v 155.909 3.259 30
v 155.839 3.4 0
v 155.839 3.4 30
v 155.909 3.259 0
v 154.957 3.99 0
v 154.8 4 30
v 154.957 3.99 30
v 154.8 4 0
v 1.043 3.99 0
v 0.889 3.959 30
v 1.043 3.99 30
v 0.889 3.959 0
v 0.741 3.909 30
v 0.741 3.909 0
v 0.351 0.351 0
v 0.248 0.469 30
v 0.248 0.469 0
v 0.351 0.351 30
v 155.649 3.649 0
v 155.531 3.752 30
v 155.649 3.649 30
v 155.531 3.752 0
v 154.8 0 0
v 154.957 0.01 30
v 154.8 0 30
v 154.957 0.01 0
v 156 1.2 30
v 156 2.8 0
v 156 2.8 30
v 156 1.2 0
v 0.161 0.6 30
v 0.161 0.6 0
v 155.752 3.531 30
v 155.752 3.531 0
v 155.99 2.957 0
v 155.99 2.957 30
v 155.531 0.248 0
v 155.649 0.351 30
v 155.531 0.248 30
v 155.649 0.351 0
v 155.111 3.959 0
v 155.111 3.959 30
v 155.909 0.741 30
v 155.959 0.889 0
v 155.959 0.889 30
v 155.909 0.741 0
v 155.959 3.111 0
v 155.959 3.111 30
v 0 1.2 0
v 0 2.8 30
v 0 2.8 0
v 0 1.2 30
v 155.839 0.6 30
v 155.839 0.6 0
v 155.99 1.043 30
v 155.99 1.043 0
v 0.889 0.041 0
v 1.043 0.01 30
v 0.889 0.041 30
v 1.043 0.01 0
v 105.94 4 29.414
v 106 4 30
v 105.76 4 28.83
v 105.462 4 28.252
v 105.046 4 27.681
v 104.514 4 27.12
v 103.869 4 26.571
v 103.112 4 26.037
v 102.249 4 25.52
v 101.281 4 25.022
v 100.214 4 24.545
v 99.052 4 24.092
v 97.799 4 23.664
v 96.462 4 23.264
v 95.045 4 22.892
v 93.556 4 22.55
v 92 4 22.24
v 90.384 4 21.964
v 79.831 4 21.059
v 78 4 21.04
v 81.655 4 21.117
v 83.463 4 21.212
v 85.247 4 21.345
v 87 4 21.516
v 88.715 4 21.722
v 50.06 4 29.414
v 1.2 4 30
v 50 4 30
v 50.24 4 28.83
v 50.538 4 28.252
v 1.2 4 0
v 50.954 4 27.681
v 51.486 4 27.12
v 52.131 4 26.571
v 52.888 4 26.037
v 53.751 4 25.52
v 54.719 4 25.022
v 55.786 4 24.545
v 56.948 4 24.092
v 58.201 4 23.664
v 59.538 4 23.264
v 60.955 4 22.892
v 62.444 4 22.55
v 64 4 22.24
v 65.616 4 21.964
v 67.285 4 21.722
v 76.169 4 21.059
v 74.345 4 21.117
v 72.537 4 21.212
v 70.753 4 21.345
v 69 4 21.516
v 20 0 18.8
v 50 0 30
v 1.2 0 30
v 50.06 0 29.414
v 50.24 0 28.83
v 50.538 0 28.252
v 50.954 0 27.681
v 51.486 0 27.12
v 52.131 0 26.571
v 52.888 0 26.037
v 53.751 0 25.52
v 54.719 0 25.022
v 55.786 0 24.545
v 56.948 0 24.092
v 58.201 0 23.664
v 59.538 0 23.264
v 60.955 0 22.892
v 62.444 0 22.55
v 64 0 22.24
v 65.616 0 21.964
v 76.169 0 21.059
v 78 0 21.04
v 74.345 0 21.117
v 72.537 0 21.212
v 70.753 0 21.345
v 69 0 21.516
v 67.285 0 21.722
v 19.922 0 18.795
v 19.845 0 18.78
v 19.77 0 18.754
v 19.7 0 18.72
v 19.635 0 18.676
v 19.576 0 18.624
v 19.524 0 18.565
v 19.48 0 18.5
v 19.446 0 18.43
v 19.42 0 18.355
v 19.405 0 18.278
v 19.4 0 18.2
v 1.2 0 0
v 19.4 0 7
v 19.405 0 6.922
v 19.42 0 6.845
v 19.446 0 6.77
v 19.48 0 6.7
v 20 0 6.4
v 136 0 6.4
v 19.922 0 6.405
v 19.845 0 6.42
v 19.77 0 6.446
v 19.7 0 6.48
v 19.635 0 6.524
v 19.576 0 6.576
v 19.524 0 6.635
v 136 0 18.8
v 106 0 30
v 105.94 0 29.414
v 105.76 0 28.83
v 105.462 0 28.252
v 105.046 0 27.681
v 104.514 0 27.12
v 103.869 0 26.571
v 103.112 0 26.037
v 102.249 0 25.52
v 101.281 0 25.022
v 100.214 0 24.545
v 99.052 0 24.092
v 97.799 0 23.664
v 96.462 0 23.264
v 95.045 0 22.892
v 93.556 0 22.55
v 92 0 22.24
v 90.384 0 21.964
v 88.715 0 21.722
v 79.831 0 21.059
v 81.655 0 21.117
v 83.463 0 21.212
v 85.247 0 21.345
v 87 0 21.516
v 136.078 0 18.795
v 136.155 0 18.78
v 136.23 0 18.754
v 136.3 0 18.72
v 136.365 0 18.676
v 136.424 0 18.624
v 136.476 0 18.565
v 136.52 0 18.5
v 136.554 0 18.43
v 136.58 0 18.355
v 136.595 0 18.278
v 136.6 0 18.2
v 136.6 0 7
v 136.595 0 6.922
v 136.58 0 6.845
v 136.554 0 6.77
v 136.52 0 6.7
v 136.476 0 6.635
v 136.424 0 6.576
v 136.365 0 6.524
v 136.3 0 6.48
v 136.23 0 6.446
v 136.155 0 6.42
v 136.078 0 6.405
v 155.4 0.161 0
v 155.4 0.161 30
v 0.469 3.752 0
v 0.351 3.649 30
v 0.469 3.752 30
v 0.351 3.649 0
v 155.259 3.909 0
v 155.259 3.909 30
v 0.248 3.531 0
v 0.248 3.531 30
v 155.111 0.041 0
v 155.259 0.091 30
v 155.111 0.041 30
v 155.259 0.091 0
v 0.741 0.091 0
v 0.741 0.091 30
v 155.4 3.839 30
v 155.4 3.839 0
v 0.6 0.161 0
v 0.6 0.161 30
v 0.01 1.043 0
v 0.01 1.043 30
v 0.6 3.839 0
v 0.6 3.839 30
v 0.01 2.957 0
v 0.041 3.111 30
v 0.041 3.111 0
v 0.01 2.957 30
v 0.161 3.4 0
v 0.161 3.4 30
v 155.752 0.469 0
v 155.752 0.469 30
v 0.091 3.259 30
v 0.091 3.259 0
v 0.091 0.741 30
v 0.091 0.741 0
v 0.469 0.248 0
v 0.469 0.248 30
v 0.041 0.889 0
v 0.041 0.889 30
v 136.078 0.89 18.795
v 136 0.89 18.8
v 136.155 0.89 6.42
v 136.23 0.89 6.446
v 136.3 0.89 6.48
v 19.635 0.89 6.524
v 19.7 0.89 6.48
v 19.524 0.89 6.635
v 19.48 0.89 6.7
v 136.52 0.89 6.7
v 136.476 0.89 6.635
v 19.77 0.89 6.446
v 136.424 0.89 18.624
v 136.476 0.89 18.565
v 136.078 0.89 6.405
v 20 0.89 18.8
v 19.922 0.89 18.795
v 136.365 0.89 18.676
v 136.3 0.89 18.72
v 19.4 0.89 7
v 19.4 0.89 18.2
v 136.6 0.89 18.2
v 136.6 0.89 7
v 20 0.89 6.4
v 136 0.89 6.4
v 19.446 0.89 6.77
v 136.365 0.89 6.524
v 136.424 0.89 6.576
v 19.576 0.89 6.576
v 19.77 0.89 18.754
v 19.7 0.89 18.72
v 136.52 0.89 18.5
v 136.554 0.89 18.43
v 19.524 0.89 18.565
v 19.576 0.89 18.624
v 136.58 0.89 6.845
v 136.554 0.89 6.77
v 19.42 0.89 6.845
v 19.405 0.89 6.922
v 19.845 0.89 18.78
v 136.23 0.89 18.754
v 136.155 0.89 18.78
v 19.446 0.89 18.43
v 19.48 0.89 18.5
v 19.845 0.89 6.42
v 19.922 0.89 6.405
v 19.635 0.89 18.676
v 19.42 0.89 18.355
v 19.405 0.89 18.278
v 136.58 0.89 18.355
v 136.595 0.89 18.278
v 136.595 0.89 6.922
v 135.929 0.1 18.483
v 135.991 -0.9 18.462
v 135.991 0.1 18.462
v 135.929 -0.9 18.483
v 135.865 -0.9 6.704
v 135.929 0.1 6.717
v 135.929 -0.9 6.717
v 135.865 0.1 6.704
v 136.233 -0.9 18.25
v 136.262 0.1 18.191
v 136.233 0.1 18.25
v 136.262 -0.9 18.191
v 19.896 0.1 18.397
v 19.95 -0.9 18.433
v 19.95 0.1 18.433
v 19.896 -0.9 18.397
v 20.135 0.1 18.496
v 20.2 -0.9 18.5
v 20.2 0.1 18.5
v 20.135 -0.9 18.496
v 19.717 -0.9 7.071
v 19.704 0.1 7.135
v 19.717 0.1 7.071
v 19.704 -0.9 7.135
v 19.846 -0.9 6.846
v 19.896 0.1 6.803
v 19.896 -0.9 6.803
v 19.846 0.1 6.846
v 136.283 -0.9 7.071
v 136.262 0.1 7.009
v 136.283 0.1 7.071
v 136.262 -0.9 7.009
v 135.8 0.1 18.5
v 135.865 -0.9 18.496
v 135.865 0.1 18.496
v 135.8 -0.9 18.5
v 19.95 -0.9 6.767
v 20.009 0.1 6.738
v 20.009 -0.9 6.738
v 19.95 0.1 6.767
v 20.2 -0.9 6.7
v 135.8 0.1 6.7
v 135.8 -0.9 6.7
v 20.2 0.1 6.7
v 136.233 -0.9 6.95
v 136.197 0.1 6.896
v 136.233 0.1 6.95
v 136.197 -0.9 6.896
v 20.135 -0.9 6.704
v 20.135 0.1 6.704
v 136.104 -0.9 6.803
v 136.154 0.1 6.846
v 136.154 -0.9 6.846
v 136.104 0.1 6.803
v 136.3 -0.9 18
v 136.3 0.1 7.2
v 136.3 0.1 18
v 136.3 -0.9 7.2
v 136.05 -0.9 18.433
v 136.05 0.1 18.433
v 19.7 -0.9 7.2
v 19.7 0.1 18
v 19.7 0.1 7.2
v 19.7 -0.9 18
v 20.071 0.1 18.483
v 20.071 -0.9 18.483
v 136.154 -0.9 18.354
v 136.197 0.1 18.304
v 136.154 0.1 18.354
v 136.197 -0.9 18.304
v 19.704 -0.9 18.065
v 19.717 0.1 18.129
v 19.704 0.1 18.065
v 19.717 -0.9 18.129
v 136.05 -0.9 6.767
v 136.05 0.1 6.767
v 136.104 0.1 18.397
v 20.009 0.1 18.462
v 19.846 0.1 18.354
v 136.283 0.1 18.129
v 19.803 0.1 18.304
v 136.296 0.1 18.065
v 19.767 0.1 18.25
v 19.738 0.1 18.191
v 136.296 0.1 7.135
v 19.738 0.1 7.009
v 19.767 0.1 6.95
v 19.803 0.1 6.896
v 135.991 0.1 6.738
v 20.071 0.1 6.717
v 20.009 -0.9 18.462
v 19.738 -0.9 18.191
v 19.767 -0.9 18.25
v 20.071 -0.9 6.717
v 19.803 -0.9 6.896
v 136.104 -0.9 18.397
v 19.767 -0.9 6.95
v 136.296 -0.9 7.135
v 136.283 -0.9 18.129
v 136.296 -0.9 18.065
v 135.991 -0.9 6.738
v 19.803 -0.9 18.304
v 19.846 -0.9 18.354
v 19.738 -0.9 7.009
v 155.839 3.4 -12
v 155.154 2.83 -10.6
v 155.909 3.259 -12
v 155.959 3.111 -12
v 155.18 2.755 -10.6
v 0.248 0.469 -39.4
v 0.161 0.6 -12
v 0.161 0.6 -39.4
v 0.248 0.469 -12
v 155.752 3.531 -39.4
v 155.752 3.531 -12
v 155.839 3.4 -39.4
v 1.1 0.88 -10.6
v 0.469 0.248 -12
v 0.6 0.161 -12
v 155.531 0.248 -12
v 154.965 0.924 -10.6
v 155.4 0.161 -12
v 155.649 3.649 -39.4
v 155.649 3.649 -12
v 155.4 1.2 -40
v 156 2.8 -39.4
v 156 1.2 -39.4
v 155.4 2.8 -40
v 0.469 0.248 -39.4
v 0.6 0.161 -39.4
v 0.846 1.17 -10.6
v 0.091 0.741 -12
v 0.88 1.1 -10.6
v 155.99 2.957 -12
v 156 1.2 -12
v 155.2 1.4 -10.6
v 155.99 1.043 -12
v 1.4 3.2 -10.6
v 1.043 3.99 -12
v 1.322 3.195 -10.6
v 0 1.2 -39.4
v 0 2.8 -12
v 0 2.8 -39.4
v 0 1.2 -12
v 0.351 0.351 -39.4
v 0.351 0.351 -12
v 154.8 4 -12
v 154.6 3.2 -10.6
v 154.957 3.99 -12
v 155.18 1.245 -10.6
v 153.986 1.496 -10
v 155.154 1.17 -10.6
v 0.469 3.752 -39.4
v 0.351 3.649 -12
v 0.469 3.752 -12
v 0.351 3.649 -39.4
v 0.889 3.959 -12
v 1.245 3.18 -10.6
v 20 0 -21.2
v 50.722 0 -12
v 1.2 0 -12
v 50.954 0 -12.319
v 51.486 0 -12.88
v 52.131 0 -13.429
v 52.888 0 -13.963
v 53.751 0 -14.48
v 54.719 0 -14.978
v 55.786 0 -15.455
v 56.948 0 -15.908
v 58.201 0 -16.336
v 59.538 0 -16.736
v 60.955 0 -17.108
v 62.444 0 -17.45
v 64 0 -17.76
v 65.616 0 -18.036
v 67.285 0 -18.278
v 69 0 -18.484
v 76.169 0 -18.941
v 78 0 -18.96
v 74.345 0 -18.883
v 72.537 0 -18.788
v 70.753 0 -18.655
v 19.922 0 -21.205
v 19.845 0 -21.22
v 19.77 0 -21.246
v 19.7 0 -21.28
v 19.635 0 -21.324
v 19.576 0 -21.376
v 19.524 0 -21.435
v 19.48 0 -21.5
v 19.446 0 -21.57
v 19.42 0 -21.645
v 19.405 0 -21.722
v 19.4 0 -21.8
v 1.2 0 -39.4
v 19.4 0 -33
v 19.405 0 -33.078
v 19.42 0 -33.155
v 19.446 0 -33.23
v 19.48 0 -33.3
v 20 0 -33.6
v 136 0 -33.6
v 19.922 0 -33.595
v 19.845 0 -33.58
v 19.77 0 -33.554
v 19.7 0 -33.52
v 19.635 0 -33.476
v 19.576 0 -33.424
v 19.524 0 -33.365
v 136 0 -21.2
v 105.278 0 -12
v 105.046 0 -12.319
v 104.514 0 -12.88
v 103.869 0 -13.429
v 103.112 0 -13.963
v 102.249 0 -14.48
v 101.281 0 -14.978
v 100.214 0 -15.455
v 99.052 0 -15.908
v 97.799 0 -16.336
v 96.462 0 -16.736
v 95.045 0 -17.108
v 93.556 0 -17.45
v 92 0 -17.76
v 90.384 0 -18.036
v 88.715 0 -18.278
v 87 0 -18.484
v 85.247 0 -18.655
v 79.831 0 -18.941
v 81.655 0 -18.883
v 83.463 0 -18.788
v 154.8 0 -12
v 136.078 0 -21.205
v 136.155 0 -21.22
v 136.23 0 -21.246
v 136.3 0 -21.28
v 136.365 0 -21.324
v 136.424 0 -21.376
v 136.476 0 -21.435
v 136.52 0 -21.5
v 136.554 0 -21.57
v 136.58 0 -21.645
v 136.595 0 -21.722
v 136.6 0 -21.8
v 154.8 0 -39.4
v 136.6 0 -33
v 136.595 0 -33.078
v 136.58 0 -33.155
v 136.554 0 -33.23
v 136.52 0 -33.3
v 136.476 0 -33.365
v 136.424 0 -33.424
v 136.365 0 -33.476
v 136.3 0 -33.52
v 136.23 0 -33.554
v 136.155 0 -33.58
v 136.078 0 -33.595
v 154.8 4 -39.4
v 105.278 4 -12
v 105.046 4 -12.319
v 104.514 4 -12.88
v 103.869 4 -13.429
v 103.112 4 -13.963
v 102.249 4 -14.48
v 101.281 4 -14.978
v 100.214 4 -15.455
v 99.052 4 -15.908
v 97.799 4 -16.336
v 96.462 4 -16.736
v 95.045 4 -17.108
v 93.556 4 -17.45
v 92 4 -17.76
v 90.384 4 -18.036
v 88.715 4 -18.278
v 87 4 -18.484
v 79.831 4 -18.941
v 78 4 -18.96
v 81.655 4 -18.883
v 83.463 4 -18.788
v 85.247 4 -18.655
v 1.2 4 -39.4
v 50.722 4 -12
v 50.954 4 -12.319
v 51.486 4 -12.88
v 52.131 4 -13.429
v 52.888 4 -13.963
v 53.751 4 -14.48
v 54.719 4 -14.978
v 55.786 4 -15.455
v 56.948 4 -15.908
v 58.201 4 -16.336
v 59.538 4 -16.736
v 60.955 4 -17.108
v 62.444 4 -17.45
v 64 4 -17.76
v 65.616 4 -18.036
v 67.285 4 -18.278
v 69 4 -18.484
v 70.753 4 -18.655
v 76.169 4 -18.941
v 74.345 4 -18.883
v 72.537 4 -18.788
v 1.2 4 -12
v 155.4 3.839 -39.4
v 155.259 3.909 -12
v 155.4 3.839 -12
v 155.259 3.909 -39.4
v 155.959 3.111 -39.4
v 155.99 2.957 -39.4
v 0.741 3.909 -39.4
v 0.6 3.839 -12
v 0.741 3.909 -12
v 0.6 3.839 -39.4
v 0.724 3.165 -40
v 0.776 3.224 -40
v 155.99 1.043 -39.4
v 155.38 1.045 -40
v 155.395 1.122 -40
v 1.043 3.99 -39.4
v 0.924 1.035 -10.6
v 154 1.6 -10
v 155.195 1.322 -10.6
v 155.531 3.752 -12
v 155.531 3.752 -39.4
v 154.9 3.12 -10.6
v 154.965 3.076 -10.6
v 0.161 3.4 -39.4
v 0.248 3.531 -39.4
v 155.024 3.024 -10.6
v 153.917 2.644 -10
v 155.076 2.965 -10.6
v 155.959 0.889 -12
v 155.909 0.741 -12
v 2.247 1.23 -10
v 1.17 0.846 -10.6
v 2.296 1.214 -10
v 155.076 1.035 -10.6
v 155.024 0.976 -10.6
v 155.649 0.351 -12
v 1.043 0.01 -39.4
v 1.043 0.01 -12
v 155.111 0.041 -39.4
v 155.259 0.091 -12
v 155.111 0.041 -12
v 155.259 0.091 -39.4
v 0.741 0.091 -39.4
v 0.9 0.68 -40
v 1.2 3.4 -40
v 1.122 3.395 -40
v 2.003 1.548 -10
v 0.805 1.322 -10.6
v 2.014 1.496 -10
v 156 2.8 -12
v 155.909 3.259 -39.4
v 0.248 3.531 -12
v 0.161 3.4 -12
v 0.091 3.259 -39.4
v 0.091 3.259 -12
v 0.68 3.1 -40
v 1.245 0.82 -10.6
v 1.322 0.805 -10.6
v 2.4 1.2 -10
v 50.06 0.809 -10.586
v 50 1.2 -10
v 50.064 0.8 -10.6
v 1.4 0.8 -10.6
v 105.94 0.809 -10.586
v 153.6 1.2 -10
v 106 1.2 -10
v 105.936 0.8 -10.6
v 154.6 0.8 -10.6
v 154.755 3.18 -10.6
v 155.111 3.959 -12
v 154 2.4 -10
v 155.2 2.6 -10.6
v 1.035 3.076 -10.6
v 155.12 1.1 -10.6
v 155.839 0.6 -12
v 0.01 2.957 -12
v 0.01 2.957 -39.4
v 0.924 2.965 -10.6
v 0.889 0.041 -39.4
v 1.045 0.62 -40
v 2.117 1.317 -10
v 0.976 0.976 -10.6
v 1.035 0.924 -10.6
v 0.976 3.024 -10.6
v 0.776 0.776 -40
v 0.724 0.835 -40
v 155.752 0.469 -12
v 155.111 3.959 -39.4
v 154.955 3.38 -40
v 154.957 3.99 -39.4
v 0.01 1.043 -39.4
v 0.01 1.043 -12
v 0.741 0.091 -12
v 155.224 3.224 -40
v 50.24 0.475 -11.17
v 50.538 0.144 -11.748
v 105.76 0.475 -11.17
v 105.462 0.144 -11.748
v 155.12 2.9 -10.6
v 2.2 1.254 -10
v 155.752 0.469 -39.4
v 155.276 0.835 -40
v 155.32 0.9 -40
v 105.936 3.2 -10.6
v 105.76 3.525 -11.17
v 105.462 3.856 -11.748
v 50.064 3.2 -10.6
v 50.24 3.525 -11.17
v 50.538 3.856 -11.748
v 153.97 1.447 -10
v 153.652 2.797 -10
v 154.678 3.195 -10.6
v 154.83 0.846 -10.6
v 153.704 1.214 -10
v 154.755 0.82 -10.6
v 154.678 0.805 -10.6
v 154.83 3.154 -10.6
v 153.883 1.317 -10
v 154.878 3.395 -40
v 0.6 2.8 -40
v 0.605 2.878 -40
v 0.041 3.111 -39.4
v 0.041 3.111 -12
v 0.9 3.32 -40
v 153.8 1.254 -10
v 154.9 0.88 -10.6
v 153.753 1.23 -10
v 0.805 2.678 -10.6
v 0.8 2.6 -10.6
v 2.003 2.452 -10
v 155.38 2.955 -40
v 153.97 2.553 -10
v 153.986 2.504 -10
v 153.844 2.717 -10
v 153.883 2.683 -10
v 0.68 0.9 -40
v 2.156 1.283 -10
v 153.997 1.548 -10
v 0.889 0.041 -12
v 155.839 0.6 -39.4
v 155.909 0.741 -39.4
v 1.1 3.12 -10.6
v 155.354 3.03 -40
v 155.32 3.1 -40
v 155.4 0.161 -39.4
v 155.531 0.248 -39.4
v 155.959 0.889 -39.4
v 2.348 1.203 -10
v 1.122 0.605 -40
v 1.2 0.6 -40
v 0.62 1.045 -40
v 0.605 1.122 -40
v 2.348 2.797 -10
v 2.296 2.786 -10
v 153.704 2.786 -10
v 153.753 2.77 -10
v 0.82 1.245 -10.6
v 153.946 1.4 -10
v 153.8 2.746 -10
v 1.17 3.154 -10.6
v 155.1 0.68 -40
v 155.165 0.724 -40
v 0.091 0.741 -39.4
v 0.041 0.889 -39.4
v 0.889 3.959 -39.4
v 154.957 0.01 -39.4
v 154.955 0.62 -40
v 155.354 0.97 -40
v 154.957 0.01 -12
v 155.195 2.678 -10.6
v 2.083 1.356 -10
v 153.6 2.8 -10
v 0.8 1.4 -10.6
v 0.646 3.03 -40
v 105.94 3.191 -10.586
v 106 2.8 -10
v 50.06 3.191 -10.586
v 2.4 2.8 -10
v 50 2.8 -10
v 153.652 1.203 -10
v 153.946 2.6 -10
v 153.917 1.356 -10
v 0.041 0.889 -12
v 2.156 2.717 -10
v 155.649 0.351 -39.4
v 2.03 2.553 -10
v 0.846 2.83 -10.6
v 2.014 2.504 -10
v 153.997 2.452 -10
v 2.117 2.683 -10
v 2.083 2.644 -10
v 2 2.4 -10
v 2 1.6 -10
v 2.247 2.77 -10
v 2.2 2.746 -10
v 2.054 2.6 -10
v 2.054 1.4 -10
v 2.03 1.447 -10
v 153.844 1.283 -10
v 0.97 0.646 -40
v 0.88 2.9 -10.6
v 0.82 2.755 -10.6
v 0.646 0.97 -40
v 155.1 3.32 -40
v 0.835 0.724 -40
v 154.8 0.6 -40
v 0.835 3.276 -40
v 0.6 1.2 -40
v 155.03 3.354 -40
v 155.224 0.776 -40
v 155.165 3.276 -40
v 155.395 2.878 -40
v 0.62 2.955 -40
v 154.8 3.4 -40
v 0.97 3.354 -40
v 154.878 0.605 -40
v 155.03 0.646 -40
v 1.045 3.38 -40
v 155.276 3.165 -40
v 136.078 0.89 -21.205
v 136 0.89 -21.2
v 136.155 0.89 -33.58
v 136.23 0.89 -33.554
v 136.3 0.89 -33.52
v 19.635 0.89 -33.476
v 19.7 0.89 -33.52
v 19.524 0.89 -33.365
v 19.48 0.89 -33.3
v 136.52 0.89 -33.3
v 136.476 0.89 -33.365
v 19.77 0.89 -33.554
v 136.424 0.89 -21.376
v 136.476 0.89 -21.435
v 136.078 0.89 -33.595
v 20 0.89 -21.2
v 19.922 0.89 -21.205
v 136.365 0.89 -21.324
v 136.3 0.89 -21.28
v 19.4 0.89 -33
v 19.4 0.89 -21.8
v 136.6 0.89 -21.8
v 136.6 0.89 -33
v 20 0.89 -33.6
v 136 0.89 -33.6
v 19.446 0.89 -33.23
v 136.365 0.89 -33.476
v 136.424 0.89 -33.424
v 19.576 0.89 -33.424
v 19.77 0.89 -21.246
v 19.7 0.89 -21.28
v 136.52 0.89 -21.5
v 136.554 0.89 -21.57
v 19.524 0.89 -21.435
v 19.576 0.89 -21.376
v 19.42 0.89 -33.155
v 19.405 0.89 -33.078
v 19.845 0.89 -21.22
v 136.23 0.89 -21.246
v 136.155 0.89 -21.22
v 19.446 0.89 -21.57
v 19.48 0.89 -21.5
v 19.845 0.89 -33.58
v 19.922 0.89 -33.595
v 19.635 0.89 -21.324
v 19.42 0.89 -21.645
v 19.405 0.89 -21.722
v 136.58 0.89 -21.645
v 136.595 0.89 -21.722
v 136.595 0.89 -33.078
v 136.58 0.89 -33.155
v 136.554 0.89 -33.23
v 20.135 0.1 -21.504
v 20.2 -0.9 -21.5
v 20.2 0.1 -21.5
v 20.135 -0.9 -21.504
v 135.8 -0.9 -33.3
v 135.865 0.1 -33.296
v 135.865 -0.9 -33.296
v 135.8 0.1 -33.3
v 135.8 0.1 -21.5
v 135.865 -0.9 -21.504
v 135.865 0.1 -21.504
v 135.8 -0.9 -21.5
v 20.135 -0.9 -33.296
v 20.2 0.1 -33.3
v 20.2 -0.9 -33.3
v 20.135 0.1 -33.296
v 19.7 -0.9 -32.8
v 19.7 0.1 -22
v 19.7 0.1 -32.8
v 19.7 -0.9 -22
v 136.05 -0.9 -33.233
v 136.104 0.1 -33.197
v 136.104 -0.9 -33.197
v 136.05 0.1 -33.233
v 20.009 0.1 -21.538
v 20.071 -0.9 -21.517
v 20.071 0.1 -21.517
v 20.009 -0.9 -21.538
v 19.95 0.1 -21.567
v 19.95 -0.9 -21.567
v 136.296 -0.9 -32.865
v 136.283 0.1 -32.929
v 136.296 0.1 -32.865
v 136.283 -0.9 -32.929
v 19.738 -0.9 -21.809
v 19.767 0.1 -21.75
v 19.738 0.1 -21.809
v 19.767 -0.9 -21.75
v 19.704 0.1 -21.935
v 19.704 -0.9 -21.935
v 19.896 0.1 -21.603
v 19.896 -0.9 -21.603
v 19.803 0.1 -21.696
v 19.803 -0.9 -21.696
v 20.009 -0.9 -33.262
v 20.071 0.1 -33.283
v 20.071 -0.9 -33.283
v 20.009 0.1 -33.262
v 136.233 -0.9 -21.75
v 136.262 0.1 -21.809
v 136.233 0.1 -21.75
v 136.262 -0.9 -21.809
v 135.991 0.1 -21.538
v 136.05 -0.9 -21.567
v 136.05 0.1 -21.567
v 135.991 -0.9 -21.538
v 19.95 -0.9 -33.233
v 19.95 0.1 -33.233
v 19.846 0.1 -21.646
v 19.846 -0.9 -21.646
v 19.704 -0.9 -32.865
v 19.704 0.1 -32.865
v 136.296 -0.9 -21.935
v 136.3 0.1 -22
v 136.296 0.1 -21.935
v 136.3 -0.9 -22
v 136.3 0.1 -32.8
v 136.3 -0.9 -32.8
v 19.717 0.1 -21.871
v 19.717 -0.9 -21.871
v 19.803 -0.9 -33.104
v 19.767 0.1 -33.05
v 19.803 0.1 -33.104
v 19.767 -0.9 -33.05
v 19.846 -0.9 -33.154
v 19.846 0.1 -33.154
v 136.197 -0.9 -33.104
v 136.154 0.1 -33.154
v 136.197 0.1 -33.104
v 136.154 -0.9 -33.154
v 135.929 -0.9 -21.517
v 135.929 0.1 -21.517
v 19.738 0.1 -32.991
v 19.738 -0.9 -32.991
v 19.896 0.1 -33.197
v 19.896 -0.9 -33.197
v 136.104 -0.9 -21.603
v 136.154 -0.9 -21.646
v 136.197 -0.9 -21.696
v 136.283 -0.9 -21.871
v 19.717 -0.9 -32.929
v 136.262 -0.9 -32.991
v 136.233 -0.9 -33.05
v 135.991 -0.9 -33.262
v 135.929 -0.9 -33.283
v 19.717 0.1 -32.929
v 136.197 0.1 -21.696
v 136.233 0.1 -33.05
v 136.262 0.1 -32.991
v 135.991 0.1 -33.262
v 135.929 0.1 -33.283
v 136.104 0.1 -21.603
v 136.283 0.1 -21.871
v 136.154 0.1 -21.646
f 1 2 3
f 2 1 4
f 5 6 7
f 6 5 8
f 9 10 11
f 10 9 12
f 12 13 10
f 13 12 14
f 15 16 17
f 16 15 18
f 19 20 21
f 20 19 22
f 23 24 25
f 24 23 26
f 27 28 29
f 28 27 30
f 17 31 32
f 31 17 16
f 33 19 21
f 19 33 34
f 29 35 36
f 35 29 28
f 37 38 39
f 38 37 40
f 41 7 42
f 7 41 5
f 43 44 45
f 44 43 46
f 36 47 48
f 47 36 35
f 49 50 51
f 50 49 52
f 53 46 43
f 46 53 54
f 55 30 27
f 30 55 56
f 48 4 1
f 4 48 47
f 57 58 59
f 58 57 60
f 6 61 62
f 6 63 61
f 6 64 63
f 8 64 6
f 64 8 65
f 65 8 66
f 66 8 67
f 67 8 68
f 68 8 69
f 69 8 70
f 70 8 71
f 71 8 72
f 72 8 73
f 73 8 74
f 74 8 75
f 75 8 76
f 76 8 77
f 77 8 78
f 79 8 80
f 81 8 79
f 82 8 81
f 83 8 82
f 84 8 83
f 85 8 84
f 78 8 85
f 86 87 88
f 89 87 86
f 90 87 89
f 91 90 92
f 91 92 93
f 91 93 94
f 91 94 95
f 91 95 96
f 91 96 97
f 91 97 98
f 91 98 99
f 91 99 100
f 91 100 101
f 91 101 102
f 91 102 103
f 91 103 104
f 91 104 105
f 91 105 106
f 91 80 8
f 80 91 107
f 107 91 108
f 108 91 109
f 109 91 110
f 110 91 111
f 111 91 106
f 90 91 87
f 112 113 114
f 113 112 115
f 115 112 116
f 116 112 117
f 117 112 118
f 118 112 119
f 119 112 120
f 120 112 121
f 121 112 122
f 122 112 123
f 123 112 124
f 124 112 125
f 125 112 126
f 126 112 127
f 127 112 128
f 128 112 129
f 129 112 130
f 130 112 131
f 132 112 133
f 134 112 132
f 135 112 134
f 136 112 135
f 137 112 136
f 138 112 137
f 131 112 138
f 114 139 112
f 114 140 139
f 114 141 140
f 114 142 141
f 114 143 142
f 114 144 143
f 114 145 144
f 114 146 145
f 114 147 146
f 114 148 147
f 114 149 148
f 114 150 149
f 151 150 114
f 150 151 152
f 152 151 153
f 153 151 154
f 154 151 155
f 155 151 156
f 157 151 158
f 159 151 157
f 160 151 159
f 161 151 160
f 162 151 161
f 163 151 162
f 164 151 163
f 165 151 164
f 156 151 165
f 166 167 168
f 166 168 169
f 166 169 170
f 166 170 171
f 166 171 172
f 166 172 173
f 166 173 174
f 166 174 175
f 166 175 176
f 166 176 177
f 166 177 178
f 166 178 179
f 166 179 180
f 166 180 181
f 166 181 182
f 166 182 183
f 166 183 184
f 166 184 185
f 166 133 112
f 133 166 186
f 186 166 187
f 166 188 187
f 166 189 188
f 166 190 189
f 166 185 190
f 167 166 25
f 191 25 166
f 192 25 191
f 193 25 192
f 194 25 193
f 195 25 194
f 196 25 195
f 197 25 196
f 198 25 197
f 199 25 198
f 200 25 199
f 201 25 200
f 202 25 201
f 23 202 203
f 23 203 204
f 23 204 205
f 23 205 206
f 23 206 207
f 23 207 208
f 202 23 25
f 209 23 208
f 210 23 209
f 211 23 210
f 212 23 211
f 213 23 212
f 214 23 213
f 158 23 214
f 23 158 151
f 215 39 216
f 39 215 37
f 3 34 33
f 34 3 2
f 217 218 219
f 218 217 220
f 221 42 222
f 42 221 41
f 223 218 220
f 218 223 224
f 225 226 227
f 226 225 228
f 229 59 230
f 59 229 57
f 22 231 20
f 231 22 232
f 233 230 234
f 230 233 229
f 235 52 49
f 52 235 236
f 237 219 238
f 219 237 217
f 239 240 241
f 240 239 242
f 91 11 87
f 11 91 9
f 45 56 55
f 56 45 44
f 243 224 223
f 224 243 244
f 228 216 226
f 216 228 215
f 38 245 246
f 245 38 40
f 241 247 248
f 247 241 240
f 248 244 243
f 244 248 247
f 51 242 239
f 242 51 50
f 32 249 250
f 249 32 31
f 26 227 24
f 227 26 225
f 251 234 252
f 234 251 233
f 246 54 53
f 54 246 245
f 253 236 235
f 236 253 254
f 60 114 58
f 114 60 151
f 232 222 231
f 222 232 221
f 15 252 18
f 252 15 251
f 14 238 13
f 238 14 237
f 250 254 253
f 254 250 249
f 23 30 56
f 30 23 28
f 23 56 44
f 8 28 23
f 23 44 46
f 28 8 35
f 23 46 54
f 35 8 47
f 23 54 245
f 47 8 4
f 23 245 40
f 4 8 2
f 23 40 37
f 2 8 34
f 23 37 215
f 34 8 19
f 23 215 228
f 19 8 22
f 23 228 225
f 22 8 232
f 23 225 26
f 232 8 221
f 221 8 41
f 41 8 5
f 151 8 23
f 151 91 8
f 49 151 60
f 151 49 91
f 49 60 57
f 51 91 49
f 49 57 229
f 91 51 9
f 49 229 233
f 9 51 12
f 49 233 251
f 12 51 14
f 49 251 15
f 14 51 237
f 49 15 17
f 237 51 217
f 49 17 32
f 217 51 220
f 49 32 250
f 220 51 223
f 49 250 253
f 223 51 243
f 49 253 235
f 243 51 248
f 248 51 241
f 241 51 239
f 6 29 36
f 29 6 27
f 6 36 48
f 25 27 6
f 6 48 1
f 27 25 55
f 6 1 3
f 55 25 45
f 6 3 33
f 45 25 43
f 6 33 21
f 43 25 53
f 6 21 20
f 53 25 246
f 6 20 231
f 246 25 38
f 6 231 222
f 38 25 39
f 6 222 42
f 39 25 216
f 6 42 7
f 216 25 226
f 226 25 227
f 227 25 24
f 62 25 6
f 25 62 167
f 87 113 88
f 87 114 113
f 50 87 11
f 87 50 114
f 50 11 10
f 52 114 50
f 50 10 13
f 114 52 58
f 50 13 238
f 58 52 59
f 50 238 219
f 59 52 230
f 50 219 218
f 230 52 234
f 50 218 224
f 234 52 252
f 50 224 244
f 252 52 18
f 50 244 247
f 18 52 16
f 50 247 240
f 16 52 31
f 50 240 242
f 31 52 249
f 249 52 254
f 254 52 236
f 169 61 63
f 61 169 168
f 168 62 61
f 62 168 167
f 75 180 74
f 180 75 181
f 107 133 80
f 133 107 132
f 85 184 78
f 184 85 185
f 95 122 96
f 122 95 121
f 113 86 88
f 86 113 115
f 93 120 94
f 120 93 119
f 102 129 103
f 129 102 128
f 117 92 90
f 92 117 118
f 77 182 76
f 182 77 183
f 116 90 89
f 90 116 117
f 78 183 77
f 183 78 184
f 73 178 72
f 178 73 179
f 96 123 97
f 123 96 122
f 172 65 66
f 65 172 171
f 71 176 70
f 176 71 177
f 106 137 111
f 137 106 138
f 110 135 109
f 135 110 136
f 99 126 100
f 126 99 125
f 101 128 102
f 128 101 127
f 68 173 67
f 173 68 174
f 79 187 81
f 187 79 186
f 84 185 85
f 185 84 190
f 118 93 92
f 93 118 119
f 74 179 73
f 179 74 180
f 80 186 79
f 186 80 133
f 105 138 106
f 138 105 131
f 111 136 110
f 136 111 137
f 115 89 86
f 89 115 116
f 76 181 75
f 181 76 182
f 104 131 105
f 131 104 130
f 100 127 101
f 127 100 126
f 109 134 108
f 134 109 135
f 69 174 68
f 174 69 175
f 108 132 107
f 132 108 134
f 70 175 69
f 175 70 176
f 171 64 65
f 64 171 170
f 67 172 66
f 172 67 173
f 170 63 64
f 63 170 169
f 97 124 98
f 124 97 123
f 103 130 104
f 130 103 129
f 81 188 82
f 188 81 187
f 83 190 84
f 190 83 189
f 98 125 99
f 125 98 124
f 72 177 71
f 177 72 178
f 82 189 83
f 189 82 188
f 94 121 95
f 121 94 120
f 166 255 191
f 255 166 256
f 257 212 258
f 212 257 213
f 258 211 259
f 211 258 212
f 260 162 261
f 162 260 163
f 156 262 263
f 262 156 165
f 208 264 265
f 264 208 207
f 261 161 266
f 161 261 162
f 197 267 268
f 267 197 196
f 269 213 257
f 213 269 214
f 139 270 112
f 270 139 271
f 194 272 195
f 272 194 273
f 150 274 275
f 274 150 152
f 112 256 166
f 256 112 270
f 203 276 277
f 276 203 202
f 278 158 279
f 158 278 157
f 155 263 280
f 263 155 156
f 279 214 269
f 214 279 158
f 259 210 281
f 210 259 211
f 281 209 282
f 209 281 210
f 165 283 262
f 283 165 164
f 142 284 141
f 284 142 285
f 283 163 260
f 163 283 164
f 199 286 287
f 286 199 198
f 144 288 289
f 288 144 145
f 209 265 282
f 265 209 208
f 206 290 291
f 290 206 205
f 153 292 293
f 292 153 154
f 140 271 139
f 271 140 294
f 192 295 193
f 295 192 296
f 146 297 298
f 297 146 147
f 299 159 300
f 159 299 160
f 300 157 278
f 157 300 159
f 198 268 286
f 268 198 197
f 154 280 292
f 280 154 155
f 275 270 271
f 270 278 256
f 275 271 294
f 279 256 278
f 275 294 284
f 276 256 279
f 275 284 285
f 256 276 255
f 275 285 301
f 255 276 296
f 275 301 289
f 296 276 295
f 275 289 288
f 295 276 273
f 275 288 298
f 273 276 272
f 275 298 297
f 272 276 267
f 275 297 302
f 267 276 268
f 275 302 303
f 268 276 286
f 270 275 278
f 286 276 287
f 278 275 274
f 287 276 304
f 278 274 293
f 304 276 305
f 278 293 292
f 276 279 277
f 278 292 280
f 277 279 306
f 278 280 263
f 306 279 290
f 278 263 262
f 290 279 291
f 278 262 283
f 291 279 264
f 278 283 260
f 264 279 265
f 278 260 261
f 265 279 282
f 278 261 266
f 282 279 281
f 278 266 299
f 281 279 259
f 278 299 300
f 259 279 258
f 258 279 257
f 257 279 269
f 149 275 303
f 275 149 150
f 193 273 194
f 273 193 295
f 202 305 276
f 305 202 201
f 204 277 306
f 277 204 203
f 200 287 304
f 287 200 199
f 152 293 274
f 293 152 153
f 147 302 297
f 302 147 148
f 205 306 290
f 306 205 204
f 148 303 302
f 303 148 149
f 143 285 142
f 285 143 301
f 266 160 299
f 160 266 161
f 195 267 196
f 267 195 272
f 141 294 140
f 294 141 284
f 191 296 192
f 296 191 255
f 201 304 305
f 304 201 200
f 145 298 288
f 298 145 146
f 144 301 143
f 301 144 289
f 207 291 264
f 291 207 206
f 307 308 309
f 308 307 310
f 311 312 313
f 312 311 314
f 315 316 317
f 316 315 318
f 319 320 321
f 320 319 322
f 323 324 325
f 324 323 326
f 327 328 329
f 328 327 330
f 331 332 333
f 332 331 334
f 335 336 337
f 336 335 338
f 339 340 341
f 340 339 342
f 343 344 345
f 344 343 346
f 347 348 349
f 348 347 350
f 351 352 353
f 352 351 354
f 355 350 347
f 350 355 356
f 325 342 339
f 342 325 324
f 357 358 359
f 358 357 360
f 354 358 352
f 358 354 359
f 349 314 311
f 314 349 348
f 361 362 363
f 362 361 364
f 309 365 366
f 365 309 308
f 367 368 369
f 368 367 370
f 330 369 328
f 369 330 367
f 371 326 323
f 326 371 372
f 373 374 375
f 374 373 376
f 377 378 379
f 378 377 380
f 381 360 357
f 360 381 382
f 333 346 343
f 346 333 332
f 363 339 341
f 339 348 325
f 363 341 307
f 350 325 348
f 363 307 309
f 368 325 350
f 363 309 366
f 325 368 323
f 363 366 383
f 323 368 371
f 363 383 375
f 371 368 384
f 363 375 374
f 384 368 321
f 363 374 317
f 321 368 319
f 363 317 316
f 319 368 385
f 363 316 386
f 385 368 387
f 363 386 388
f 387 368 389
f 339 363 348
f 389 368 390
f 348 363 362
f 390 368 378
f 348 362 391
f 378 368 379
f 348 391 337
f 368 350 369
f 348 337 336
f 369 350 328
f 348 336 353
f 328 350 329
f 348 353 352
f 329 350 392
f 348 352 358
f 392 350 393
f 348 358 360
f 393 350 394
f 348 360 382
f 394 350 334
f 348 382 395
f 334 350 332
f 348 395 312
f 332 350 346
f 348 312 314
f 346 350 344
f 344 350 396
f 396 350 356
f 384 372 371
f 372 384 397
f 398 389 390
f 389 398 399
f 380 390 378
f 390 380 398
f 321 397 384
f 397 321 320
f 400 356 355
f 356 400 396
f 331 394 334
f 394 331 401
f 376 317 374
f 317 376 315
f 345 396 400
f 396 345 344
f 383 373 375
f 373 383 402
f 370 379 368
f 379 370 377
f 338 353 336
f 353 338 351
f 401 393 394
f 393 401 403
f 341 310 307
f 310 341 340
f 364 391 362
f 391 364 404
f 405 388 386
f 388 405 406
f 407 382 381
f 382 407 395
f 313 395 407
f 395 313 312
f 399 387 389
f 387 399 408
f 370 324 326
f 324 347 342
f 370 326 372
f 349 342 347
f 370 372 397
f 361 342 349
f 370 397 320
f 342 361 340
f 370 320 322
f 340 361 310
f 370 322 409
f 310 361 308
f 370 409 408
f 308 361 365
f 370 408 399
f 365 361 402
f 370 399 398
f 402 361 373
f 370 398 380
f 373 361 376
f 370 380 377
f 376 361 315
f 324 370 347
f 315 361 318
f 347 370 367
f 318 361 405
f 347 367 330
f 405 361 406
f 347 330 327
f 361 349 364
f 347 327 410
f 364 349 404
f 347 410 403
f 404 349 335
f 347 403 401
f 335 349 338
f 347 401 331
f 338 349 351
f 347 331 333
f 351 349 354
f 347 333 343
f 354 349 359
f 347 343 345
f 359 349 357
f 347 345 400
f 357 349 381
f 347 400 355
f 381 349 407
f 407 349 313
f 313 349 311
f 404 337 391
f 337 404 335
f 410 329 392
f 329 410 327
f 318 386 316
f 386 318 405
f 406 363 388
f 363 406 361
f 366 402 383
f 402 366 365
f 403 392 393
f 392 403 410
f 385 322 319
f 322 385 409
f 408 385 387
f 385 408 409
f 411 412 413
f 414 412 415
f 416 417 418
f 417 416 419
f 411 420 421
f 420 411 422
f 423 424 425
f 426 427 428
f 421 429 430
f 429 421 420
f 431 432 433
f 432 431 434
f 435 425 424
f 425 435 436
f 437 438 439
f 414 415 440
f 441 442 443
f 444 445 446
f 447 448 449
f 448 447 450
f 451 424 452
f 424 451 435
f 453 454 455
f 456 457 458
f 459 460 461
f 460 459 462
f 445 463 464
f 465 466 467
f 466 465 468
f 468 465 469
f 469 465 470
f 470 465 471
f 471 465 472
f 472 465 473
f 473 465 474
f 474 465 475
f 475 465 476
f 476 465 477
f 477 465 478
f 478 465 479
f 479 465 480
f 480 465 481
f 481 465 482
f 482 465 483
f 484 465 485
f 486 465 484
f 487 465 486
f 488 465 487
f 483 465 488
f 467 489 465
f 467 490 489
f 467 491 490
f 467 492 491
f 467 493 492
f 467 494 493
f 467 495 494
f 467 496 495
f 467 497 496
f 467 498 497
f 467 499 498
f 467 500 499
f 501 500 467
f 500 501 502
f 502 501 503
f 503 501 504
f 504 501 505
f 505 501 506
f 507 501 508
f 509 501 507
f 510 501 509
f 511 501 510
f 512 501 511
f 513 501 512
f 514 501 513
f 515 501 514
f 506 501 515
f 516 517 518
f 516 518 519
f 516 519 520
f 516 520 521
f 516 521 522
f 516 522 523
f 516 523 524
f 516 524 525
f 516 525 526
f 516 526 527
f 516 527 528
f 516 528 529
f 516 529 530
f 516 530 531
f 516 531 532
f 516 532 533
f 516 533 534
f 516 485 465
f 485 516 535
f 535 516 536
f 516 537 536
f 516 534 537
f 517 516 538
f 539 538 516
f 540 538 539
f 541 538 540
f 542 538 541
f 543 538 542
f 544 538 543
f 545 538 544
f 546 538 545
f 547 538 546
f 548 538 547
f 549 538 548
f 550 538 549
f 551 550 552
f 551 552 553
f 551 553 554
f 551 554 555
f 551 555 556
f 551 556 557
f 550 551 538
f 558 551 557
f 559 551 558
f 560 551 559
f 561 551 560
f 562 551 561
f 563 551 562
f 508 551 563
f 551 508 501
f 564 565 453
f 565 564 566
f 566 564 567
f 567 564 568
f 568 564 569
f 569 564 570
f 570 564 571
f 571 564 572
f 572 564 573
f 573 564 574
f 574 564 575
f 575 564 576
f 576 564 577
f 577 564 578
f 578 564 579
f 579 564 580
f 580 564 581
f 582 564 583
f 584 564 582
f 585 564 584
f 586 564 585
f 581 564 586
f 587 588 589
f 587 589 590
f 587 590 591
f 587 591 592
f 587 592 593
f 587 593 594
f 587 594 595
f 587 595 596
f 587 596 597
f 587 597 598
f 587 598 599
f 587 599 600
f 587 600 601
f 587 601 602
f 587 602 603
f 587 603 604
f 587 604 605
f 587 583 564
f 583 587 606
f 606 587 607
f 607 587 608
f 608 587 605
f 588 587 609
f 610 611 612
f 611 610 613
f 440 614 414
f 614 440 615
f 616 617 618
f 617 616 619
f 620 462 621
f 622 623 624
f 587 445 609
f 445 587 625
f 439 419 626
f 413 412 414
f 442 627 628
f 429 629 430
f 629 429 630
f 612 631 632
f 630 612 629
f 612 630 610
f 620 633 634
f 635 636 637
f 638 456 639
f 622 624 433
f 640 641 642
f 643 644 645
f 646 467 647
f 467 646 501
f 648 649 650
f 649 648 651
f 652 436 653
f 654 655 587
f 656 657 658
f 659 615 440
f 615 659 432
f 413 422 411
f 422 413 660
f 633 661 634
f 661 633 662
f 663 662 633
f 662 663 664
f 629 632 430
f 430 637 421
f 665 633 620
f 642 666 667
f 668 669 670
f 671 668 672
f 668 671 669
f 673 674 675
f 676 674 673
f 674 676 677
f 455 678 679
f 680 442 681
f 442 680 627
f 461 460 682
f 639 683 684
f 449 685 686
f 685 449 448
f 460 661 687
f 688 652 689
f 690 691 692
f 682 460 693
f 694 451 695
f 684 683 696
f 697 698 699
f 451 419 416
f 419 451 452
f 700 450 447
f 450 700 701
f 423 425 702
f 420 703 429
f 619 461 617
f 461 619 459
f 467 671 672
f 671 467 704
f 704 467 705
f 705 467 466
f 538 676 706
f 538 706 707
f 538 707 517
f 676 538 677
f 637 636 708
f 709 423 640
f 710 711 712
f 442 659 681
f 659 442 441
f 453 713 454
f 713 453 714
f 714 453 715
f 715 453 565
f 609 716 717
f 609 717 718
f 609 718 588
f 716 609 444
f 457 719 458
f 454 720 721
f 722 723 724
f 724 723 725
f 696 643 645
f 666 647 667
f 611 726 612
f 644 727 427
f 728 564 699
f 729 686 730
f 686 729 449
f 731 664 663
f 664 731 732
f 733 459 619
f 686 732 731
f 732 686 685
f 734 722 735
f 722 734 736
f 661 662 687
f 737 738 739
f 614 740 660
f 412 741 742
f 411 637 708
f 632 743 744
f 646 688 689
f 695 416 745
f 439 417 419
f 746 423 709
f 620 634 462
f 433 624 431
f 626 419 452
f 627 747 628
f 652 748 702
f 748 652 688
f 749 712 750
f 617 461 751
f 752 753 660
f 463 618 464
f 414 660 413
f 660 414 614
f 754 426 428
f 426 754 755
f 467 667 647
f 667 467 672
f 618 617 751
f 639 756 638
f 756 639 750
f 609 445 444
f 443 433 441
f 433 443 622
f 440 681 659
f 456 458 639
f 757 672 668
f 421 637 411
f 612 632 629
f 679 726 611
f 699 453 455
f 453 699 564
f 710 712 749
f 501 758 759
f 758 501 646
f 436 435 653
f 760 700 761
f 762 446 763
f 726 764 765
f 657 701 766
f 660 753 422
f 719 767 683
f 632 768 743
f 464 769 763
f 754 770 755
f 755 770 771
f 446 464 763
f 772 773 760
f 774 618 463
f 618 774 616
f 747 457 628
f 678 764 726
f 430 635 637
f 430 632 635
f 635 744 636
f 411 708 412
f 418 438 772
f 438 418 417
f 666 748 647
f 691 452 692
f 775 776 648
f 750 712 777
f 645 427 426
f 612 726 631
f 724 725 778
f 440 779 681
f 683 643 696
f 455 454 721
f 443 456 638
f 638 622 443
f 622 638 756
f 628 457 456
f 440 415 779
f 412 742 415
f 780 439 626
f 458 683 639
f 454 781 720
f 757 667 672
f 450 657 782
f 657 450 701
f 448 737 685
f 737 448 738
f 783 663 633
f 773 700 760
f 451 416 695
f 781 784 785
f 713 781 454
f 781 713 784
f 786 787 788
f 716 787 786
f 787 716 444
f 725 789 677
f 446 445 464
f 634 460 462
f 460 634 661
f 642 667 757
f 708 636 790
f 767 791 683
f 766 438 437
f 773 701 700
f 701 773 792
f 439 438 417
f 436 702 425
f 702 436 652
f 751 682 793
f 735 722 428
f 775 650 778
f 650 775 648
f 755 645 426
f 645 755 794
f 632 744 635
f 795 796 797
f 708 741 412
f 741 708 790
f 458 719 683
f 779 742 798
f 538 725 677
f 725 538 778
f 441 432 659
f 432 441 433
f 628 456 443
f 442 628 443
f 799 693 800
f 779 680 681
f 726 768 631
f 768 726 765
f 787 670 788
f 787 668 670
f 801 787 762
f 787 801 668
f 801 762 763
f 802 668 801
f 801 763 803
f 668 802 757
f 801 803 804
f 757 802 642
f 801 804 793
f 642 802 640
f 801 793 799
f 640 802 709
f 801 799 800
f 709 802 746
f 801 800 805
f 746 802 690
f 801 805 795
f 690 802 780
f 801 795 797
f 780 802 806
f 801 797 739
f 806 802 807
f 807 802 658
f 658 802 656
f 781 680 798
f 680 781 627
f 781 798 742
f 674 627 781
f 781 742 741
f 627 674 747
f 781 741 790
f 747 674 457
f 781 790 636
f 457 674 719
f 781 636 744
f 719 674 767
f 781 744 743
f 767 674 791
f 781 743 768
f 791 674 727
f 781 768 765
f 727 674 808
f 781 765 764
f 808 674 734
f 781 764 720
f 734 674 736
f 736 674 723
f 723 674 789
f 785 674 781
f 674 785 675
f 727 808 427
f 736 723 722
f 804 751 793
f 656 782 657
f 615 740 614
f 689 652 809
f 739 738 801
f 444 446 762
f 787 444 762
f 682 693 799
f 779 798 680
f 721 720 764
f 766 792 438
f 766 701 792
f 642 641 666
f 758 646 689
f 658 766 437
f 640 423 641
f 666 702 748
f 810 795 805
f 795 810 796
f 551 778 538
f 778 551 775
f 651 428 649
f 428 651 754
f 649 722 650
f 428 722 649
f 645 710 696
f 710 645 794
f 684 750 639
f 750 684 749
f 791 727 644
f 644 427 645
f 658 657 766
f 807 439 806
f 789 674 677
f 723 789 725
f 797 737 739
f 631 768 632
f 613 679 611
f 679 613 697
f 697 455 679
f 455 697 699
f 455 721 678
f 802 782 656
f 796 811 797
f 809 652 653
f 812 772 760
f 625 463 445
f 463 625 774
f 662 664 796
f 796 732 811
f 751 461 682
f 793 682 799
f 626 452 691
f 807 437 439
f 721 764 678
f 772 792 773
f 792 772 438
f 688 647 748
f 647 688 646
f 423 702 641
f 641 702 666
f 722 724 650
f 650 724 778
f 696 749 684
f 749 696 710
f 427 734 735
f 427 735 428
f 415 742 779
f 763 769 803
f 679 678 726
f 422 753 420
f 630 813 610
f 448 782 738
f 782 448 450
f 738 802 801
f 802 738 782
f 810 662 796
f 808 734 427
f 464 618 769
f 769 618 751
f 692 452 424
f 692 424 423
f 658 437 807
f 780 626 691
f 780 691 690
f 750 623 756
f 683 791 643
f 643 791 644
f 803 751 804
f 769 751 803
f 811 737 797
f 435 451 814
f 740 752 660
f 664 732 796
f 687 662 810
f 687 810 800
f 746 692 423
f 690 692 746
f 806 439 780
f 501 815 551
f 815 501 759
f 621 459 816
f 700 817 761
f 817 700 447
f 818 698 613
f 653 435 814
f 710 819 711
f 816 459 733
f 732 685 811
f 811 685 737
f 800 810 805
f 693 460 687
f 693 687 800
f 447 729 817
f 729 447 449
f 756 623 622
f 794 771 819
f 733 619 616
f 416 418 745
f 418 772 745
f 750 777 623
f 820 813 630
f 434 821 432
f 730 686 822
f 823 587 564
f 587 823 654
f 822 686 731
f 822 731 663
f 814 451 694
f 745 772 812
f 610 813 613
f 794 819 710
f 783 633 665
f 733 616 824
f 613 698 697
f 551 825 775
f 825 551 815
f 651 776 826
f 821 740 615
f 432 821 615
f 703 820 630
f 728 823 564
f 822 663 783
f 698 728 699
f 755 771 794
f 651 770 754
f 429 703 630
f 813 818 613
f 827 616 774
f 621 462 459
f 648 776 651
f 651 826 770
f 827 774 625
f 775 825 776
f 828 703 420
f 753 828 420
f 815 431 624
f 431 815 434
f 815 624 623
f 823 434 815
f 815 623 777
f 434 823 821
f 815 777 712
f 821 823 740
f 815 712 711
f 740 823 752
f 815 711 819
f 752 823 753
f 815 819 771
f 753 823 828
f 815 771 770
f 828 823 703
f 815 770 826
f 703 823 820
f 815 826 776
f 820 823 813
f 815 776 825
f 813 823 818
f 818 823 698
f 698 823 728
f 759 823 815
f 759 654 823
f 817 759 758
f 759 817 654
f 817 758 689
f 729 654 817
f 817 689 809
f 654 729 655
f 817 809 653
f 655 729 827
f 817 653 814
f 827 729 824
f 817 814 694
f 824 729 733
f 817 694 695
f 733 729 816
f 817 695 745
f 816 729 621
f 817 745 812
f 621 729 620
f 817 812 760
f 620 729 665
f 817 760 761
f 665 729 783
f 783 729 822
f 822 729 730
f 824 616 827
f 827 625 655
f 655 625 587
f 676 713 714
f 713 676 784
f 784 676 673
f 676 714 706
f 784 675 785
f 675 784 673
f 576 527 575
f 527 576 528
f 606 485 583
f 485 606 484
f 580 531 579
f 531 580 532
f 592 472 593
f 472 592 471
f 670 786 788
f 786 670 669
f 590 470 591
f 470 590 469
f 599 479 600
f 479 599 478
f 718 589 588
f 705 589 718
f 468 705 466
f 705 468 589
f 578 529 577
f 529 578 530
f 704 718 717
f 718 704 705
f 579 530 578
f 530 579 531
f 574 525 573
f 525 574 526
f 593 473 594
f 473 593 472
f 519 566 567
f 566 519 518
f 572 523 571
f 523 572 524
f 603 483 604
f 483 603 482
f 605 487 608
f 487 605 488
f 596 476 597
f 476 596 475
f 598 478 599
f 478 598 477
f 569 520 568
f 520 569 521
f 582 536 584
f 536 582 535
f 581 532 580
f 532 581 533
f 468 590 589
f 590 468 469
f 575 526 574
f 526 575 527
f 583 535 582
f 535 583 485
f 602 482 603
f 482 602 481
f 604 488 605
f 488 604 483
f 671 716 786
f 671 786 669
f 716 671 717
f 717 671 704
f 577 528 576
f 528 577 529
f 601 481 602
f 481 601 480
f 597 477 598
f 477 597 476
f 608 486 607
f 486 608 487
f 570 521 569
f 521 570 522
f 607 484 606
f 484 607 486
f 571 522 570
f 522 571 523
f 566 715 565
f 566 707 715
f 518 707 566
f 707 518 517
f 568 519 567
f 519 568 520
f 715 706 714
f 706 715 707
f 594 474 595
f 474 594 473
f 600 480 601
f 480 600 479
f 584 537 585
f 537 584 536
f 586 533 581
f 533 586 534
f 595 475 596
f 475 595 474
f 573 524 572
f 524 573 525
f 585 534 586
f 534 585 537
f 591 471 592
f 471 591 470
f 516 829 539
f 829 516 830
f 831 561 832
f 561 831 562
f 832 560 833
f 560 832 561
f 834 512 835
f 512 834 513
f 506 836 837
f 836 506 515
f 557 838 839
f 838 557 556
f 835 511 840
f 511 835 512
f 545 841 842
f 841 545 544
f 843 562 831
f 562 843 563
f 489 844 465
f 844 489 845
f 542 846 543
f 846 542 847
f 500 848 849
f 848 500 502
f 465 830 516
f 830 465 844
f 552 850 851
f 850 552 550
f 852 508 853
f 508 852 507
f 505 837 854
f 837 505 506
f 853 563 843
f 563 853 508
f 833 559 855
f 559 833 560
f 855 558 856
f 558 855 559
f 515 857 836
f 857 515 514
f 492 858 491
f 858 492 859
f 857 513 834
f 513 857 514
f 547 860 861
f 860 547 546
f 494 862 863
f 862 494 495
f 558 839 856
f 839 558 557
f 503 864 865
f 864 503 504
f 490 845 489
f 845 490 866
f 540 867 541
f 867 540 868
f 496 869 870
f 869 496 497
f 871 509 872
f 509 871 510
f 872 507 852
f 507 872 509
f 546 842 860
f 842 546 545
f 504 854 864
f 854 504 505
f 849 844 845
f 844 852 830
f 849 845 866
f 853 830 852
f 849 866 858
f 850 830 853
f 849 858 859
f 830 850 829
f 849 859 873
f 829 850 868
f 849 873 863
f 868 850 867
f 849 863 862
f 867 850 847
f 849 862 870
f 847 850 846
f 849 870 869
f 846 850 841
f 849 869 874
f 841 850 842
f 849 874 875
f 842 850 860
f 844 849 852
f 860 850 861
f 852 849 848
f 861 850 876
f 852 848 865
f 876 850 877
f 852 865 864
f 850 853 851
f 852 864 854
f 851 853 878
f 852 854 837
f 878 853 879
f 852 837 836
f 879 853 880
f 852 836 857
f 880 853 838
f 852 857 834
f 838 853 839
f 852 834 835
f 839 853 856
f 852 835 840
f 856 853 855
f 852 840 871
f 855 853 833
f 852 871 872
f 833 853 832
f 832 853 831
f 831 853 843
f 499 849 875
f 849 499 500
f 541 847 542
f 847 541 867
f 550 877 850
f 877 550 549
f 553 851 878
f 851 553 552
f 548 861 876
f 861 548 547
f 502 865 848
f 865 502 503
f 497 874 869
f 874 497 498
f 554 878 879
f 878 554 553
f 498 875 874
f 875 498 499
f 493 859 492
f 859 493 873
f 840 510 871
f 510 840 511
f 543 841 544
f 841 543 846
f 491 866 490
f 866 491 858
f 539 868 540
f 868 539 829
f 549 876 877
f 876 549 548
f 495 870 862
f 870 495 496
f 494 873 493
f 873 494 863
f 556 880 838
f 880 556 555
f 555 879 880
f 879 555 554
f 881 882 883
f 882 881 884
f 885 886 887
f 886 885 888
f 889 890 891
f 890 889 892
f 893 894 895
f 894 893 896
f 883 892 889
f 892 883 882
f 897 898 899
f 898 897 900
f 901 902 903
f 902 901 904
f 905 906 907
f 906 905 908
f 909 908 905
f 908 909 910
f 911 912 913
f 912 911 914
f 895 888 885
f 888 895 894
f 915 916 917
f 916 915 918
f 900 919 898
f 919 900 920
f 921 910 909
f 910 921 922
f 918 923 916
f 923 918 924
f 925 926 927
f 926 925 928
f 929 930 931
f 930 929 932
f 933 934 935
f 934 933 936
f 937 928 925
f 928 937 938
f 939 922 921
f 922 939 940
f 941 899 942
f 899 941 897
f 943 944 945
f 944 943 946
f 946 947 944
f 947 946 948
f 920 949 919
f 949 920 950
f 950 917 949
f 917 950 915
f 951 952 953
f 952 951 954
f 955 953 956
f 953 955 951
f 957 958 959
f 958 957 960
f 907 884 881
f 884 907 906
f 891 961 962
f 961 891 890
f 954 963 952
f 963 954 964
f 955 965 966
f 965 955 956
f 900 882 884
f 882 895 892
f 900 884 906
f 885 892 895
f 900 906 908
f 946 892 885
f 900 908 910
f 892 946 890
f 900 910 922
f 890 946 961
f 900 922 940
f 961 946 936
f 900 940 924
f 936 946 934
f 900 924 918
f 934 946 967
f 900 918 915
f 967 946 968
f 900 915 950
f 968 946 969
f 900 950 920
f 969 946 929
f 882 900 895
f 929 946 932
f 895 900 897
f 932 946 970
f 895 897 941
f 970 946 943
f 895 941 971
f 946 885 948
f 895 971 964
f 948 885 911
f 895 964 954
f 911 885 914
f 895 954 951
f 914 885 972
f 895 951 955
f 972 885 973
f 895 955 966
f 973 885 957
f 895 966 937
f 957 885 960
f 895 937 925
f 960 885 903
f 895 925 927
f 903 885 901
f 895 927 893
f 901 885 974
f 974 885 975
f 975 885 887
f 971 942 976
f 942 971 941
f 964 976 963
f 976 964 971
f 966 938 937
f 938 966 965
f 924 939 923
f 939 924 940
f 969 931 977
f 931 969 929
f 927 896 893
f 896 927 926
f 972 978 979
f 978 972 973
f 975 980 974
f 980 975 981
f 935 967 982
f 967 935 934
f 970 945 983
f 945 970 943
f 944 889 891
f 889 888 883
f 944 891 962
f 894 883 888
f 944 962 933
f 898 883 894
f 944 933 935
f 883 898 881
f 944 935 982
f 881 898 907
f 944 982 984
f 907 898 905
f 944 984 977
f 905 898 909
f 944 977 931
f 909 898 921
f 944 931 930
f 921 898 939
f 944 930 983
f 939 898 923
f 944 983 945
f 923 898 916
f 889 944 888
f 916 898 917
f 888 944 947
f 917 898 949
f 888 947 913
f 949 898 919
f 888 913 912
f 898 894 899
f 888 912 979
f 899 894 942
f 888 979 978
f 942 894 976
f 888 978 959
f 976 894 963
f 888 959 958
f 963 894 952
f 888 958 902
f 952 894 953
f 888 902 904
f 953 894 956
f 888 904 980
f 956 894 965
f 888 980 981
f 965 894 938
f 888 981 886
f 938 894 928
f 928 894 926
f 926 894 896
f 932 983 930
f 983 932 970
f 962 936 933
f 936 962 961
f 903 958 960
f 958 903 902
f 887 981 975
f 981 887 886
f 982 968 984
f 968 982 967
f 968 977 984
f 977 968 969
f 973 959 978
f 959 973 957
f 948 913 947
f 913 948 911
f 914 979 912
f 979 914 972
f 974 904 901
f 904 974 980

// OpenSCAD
// Review proto (not a part): the drawer's front panel, today (r 1.2 vertical edges, a label recess for a
// blank 100 × 12 strip or tape) and proposed (the same panel with a 0.6 mm × 45° chamfer on the bed edge
// against the elephant's foot, R 2 on the top edges, and the bay label as a two-colour inlay: the ID
// debossed 0.8 mm into the label strip, the second nozzle filling it).  docs/printed-parts-review.md ›
// Drawer, Label.
//
//   openscad -D 'VIEW="both"' -o drawer_front.png mechanical/review/proto/drawer_front.scad
VIEW = "both";
W = 156; H = 30; T = 4; ID = "B3";
$fn = 48;
module rbox(size, r) hull() for (x = [r, size[0] - r], y = [r, size[1] - r]) translate([x, y, 0]) cylinder(r = r, h = size[2]);
module scoop() translate([W / 2, -0.01, H]) rotate([-90, 0, 0]) scale([1, 0.32, 1]) cylinder(r = 28, h = T + 0.02, $fn = 96);
module recess() translate([W / 2, -0.01, H * 0.42]) rotate([90, 0, 0]) mirror([0, 0, 1]) linear_extrude(0.9) offset(r = 0.6) square([W - 40, 11.2], center = true);

module today() {
    color("#a9c4e4") difference() { rbox([W, T, H], 1.2); scoop(); recess(); }
    color("#f4f4f4") translate([W / 2, -0.9, H * 0.42]) rotate([90, 0, 0]) mirror([0, 0, 1]) linear_extrude(1.0) offset(r = 0.5) square([W - 40 - 0.4, 11.2 - 0.4], center = true);   // the blank label
}

// chamfered foot, rounded top: the panel as a hull of its bottom (inset 0.6) and its top (r 2 fillet approximated by a 45° step + offset)
module panel_proposed() hull() {
    translate([0.6, 0.6, 0]) rbox([W - 1.2, T - 1.2, 0.01], 0.6);                         // the bed edge, 0.6 in: a 45° chamfer up to z 0.6
    translate([0, 0, 0.6]) rbox([W, T, H - 2.6], 1.2);
    translate([0.8, 0.8, H - 2]) rbox([W - 1.6, T - 1.6, 1.4], 0.6);                      // the top edge eased
    translate([2, 2, H - 0.01]) rbox([W - 4, T - 4, 0.01], 0.4);
}
module proposed() {
    color("#a9c4e4") difference() { panel_proposed(); scoop(); recess(); }
    // the label strip with its ID debossed, filled by the second nozzle (two colours, one object)
    translate([W / 2, -0.9, H * 0.42]) rotate([90, 0, 0]) mirror([0, 0, 1]) {
        color("#f4f4f4") difference() {
            linear_extrude(1.0) offset(r = 0.5) square([W - 40 - 0.4, 11.2 - 0.4], center = true);
            translate([0, 0, -1]) linear_extrude(1.8) text(ID, size = 7, font = "Liberation Sans:style=Bold", halign = "center", valign = "center");
        }
        color("#1d2b22") linear_extrude(0.8) text(ID, size = 7, font = "Liberation Sans:style=Bold", halign = "center", valign = "center");
    }
}

if (VIEW == "today" || VIEW == "both") today();
if (VIEW == "proposed" || VIEW == "both") translate([0, 0, VIEW == "both" ? -40 : 0]) proposed();
